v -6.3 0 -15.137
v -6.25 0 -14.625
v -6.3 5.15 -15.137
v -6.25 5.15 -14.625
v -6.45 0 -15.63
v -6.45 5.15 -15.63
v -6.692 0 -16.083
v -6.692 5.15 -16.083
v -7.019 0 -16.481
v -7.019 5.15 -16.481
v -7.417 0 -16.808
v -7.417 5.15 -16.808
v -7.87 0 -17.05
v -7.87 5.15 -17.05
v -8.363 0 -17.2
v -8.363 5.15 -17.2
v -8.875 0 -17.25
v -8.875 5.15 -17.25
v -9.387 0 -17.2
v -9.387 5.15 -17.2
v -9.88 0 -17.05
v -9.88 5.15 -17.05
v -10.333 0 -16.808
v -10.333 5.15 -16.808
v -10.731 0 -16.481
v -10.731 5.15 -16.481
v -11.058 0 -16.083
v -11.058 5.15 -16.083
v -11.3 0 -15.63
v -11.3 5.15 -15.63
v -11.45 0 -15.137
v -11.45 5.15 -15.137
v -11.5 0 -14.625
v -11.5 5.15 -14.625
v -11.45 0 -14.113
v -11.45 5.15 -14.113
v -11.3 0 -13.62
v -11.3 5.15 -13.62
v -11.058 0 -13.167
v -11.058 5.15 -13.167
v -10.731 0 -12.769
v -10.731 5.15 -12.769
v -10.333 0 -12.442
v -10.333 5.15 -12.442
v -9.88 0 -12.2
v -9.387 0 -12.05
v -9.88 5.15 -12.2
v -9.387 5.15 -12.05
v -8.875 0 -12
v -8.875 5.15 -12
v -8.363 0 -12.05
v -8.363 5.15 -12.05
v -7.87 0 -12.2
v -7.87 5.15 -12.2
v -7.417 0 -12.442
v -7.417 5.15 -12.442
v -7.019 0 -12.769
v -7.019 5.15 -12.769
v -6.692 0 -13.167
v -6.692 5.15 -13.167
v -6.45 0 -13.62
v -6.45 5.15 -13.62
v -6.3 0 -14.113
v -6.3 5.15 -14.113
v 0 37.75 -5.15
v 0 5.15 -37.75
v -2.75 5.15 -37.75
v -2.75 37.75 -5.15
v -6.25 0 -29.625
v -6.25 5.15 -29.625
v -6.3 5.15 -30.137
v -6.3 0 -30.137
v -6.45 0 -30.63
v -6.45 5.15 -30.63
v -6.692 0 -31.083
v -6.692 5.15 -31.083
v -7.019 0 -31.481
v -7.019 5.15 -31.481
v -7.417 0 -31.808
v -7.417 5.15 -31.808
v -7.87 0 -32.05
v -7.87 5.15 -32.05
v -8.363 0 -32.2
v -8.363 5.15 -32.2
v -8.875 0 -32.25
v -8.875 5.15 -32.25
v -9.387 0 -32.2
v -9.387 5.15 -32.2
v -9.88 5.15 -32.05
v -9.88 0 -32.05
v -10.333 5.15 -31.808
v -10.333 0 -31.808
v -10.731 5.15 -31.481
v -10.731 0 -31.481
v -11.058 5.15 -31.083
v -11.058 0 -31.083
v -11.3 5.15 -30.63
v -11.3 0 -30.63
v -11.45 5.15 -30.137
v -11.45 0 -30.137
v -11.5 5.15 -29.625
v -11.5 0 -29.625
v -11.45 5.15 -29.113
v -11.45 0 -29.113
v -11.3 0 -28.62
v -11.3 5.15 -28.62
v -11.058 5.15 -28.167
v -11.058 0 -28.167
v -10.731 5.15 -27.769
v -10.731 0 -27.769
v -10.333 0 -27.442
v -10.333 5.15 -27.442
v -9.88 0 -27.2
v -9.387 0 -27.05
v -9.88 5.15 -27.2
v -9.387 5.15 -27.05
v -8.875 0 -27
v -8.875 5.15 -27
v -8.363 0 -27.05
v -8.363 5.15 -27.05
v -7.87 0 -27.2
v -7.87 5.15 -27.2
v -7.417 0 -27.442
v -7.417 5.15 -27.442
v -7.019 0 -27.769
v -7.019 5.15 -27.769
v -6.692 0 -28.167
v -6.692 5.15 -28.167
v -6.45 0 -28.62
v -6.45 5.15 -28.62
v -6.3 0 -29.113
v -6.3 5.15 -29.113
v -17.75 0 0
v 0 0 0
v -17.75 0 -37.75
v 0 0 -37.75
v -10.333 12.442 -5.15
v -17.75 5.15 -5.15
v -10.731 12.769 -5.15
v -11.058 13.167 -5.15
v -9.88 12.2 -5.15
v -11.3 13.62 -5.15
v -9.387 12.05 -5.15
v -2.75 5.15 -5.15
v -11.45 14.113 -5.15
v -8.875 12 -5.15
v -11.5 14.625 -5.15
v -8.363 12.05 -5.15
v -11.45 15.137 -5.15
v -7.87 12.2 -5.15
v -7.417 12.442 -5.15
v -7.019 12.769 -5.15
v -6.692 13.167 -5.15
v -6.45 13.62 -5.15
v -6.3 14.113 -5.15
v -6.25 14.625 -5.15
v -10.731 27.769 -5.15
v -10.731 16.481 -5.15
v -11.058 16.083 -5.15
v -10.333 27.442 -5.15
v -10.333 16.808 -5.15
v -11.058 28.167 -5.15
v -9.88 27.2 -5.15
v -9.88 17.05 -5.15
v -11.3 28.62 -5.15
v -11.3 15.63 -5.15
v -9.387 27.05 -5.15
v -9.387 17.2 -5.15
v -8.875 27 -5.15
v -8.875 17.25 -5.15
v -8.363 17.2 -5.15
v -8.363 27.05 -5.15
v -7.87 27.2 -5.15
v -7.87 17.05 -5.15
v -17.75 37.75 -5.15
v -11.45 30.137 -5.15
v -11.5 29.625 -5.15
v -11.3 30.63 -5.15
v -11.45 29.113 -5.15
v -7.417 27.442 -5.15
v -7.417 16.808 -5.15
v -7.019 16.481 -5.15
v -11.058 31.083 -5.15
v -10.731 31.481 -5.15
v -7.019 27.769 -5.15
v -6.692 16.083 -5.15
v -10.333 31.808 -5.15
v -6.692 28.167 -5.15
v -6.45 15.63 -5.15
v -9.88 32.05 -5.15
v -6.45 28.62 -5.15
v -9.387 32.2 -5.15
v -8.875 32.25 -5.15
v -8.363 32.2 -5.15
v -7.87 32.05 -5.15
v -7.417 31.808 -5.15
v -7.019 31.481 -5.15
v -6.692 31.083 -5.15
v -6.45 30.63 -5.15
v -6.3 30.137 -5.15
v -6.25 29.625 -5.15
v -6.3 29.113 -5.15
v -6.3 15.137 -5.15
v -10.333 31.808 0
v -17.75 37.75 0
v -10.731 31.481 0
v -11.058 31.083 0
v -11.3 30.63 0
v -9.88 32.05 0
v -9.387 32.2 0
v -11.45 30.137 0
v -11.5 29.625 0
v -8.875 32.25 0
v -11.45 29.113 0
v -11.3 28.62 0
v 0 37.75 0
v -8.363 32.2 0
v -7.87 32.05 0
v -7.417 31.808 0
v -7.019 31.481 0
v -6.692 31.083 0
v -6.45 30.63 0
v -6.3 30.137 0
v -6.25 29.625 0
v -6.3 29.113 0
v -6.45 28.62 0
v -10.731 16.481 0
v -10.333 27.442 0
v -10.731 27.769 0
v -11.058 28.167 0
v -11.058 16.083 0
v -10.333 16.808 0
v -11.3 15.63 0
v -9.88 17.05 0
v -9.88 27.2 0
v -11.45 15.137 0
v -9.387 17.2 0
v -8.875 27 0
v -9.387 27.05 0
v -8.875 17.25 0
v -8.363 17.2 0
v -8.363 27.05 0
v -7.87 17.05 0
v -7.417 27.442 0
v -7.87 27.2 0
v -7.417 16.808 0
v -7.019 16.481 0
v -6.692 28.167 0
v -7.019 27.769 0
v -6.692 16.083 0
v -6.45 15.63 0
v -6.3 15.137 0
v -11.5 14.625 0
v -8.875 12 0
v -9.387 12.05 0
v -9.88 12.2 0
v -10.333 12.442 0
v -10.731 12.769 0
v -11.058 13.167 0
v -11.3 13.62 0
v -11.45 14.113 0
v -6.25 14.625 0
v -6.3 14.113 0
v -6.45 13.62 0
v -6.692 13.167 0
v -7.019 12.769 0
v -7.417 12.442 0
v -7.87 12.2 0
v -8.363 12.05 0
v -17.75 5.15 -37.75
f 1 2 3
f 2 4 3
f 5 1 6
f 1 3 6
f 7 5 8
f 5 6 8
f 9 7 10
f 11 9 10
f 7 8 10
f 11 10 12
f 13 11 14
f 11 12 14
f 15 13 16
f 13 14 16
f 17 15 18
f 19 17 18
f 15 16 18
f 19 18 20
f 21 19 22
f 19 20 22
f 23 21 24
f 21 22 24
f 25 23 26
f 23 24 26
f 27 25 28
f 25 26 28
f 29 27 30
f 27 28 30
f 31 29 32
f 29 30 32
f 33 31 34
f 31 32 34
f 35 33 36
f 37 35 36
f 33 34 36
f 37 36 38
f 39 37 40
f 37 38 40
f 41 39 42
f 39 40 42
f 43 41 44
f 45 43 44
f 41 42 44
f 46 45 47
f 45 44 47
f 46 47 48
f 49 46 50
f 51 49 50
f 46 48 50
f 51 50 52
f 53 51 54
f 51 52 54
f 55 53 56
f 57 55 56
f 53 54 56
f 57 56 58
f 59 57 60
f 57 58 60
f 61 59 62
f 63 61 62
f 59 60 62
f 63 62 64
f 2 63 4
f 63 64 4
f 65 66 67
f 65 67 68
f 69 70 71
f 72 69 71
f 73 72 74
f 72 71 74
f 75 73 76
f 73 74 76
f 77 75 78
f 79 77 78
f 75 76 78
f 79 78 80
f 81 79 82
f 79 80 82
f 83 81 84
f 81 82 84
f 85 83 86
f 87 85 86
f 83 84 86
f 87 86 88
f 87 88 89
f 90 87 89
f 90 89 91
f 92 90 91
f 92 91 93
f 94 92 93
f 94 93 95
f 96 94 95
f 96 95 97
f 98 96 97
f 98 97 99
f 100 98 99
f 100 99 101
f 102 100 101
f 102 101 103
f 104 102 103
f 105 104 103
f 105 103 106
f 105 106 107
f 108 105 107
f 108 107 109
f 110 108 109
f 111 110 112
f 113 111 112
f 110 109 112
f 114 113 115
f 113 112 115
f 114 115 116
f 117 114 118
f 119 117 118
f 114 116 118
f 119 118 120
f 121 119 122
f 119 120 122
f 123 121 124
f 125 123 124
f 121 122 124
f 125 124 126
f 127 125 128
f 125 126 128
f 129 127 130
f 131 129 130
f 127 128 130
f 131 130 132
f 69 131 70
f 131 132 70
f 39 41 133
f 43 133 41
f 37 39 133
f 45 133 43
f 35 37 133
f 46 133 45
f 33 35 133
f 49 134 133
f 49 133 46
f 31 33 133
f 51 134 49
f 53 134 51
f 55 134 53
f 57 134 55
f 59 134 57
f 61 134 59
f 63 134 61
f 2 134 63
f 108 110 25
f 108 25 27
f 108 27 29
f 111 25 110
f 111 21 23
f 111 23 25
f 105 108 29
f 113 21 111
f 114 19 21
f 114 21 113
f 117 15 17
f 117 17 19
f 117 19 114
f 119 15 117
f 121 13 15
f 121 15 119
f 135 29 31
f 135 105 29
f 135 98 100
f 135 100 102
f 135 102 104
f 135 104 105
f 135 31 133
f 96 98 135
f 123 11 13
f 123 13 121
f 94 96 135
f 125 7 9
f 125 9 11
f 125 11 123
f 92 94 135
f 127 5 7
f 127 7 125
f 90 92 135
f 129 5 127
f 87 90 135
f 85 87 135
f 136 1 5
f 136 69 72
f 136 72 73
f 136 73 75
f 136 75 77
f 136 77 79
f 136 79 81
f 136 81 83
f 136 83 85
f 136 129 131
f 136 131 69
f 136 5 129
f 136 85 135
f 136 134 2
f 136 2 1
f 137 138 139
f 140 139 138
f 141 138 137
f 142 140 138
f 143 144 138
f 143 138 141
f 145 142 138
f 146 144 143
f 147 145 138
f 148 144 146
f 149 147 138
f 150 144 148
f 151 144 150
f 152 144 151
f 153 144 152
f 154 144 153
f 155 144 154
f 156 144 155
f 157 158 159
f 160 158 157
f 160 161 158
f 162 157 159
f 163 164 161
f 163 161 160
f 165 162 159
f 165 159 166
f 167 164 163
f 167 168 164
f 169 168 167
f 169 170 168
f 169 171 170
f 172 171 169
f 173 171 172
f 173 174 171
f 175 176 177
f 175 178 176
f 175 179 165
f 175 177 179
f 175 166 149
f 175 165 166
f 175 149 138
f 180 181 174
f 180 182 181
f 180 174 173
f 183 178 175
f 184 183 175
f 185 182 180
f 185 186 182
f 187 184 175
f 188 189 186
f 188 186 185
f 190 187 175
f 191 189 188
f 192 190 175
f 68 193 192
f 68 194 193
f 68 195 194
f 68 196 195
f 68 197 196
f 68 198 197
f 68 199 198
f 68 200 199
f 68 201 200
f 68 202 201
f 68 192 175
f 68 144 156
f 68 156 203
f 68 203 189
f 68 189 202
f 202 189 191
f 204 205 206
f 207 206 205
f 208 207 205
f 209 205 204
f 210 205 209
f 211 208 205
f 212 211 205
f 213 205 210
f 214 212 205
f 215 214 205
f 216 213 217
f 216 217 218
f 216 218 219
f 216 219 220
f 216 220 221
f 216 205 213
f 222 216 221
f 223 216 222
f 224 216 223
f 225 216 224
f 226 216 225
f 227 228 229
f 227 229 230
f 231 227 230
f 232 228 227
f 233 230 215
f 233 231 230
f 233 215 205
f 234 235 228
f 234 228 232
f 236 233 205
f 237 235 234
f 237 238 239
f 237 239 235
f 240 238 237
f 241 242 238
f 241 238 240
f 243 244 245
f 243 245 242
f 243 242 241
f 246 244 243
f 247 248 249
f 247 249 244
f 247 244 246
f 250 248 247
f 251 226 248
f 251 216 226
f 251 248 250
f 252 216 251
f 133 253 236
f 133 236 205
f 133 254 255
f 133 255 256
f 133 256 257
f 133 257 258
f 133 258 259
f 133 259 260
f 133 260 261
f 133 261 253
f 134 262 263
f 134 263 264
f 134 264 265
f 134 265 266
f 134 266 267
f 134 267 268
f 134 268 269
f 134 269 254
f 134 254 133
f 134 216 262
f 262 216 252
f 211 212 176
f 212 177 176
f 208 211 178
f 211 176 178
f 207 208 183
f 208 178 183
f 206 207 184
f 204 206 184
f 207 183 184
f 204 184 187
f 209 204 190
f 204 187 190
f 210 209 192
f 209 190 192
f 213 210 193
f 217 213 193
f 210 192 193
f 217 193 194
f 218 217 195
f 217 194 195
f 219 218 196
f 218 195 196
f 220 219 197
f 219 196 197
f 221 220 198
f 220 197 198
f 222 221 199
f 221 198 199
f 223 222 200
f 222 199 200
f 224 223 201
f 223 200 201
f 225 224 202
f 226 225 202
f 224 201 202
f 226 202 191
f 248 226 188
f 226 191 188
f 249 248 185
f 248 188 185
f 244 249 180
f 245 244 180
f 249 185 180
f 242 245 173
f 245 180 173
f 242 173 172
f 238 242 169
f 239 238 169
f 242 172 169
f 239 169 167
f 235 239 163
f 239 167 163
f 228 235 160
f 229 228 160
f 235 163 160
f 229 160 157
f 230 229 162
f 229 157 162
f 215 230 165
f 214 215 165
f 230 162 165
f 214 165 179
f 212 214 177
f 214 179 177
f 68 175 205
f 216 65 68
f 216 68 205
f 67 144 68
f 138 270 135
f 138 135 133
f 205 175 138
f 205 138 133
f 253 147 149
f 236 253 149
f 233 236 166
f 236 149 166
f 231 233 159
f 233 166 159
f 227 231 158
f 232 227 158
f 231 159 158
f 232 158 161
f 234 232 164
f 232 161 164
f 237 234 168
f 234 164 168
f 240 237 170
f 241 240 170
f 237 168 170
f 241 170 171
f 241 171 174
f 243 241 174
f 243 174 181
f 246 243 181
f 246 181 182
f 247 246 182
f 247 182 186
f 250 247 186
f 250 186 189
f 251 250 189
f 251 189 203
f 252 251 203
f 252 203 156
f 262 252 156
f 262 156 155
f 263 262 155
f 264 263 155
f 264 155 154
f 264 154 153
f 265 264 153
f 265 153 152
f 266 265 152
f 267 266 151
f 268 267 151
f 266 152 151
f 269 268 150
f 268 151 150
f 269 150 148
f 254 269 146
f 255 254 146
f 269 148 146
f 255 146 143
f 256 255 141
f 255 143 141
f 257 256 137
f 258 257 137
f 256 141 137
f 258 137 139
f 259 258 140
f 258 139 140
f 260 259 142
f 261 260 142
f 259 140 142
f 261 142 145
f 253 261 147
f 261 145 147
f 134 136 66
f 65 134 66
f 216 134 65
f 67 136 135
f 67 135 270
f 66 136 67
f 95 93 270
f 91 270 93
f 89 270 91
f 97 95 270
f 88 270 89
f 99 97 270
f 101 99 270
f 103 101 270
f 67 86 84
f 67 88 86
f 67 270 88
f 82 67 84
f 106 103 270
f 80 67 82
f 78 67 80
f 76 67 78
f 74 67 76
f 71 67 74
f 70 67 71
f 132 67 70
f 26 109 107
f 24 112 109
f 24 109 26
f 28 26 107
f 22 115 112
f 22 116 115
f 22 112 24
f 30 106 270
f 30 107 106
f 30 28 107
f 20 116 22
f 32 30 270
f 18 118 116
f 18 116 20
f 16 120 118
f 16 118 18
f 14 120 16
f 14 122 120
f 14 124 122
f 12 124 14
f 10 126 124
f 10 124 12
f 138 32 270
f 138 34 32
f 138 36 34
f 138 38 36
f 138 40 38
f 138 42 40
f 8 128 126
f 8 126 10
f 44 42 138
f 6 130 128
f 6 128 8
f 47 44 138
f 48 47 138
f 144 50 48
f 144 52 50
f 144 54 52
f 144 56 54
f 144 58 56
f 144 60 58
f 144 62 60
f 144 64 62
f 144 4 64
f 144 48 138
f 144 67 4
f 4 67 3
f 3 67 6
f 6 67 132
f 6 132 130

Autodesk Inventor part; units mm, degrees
ref_plane "YZ Plane" through (0, 0, 0) normal (1, 0, 0) x (0, 1, 0)
ref_plane "XZ Plane" through (0, 0, 0) normal (0, 1, 0) x (-1, 0, 0)
ref_plane "XY Plane" through (0, 0, 0) normal (0, 0, 1) x (1, 0, 0)
sketch "Sketch1" plane through (0, 0, 0) normal (1, 0, 0) x (0, 1, 0)
  line L0 (0, 0) -> (0, -37.75)
  line L1 (0, -37.75) -> (5.15, -37.75)
  line L2 (5.15, -37.75) -> (37.75, -5.15)
  line L3 (37.75, -5.15) -> (37.75, 0)
  line L4 (37.75, 0) -> (0, 0)
  dimension "d0" = 135
  dimension "d1" = 37.75
  dimension "d2" = 5.15
  dimension "d3" = 5.15
extrude "Extrusion1" add sketch "Sketch1" against normal blind 2.75
sketch "Sketch2" plane through (-2.75, 0, 0) normal (-1, 0, 0) x (0, 0, 1)
  line L0 (-37.75, 5.15) -> (-37.75, 0) projected
  line L1 (-37.75, 0) -> (0, 0) projected
  line L2 (0, 0) -> (0, 37.75) projected
  line L3 (0, 37.75) -> (-5.15, 37.75) projected
  line L4 (-5.15, 37.75) -> (-37.75, 5.15) projected
  line L5 (-37.75, 5.15) -> (-37.75, 0) projected
  line L6 (-37.75, 5.15) -> (-5.15, 5.15)
  line L7 (0, 37.75) -> (-5.15, 37.75) projected
  line L8 (-5.15, 5.15) -> (-5.15, 37.75)
extrude "Extrusion2" add sketch "Sketch2" along normal blind 15 contours L6 L8 L3 L2 L1 L0
sketch "Sketch3" plane through (-2.75, 5.15, -5.15) normal (0, 1, 0) x (1, 0, 0)
  line L0 (0, 0) -> (-15, 0) construction
  line L1 (-6.125, 0.4254) -> (-6.125, 32.6) construction
  line L2 (2.75, 32.6) -> (-15, 32.6) construction
  circle A0 centre (-6.125, 24.475) radius 2.625
  circle A1 centre (-6.125, 9.475) radius 2.625
  line L3 (-6.125, 2.1875) -> (-15, 2.1875) construction
  line L4 (-15, 32.6) -> (-15, -5.15) construction
  line L5 (-6.125, 2.1875) -> (2.75, 2.1875) construction
  line L6 (2.75, -5.15) -> (2.75, 32.6) construction
  dimension "d8" = 5.25
  dimension "d9" = 8.125
  dimension "d10" = 5.25
  dimension "d11" = 23.125
extrude "Extrusion3" cut sketch "Sketch3" against normal up to next
sketch "Sketch4" plane through (-2.75, 5.15, -5.15) normal (0, 0, -1) x (-1, 0, 0)
  line L0 (0, 0) -> (15, 0) construction
  line L1 (6.125, -0.1704) -> (6.125, 32.4296) construction
  line L2 (0, 32.6) -> (15, 32.6) construction
  circle A0 centre (6.125, 24.475) radius 2.625
  circle A1 centre (6.125, 9.475) radius 2.625
  line L3 (6.125, 29.763) -> (15, 29.763) construction
  line L4 (15, 32.6) -> (15, 0) construction
  line L5 (6.125, 29.763) -> (-2.75, 29.763) construction
  line L6 (-2.75, 32.6) -> (-2.75, -5.15) construction
  dimension "d14" = 5.25
  dimension "d15" = 5.25
  dimension "d16" = 8.125
  dimension "d17" = 23.125
extrude "Extrusion4" cut sketch "Sketch4" against normal up to next
equation "\"d3\" = d2"
equation "\"d10\" = d8"
equation "\"d15\" = d14"
properties part number "2020 Extrusion 90deg 4Hole Aluminum Bracket"
